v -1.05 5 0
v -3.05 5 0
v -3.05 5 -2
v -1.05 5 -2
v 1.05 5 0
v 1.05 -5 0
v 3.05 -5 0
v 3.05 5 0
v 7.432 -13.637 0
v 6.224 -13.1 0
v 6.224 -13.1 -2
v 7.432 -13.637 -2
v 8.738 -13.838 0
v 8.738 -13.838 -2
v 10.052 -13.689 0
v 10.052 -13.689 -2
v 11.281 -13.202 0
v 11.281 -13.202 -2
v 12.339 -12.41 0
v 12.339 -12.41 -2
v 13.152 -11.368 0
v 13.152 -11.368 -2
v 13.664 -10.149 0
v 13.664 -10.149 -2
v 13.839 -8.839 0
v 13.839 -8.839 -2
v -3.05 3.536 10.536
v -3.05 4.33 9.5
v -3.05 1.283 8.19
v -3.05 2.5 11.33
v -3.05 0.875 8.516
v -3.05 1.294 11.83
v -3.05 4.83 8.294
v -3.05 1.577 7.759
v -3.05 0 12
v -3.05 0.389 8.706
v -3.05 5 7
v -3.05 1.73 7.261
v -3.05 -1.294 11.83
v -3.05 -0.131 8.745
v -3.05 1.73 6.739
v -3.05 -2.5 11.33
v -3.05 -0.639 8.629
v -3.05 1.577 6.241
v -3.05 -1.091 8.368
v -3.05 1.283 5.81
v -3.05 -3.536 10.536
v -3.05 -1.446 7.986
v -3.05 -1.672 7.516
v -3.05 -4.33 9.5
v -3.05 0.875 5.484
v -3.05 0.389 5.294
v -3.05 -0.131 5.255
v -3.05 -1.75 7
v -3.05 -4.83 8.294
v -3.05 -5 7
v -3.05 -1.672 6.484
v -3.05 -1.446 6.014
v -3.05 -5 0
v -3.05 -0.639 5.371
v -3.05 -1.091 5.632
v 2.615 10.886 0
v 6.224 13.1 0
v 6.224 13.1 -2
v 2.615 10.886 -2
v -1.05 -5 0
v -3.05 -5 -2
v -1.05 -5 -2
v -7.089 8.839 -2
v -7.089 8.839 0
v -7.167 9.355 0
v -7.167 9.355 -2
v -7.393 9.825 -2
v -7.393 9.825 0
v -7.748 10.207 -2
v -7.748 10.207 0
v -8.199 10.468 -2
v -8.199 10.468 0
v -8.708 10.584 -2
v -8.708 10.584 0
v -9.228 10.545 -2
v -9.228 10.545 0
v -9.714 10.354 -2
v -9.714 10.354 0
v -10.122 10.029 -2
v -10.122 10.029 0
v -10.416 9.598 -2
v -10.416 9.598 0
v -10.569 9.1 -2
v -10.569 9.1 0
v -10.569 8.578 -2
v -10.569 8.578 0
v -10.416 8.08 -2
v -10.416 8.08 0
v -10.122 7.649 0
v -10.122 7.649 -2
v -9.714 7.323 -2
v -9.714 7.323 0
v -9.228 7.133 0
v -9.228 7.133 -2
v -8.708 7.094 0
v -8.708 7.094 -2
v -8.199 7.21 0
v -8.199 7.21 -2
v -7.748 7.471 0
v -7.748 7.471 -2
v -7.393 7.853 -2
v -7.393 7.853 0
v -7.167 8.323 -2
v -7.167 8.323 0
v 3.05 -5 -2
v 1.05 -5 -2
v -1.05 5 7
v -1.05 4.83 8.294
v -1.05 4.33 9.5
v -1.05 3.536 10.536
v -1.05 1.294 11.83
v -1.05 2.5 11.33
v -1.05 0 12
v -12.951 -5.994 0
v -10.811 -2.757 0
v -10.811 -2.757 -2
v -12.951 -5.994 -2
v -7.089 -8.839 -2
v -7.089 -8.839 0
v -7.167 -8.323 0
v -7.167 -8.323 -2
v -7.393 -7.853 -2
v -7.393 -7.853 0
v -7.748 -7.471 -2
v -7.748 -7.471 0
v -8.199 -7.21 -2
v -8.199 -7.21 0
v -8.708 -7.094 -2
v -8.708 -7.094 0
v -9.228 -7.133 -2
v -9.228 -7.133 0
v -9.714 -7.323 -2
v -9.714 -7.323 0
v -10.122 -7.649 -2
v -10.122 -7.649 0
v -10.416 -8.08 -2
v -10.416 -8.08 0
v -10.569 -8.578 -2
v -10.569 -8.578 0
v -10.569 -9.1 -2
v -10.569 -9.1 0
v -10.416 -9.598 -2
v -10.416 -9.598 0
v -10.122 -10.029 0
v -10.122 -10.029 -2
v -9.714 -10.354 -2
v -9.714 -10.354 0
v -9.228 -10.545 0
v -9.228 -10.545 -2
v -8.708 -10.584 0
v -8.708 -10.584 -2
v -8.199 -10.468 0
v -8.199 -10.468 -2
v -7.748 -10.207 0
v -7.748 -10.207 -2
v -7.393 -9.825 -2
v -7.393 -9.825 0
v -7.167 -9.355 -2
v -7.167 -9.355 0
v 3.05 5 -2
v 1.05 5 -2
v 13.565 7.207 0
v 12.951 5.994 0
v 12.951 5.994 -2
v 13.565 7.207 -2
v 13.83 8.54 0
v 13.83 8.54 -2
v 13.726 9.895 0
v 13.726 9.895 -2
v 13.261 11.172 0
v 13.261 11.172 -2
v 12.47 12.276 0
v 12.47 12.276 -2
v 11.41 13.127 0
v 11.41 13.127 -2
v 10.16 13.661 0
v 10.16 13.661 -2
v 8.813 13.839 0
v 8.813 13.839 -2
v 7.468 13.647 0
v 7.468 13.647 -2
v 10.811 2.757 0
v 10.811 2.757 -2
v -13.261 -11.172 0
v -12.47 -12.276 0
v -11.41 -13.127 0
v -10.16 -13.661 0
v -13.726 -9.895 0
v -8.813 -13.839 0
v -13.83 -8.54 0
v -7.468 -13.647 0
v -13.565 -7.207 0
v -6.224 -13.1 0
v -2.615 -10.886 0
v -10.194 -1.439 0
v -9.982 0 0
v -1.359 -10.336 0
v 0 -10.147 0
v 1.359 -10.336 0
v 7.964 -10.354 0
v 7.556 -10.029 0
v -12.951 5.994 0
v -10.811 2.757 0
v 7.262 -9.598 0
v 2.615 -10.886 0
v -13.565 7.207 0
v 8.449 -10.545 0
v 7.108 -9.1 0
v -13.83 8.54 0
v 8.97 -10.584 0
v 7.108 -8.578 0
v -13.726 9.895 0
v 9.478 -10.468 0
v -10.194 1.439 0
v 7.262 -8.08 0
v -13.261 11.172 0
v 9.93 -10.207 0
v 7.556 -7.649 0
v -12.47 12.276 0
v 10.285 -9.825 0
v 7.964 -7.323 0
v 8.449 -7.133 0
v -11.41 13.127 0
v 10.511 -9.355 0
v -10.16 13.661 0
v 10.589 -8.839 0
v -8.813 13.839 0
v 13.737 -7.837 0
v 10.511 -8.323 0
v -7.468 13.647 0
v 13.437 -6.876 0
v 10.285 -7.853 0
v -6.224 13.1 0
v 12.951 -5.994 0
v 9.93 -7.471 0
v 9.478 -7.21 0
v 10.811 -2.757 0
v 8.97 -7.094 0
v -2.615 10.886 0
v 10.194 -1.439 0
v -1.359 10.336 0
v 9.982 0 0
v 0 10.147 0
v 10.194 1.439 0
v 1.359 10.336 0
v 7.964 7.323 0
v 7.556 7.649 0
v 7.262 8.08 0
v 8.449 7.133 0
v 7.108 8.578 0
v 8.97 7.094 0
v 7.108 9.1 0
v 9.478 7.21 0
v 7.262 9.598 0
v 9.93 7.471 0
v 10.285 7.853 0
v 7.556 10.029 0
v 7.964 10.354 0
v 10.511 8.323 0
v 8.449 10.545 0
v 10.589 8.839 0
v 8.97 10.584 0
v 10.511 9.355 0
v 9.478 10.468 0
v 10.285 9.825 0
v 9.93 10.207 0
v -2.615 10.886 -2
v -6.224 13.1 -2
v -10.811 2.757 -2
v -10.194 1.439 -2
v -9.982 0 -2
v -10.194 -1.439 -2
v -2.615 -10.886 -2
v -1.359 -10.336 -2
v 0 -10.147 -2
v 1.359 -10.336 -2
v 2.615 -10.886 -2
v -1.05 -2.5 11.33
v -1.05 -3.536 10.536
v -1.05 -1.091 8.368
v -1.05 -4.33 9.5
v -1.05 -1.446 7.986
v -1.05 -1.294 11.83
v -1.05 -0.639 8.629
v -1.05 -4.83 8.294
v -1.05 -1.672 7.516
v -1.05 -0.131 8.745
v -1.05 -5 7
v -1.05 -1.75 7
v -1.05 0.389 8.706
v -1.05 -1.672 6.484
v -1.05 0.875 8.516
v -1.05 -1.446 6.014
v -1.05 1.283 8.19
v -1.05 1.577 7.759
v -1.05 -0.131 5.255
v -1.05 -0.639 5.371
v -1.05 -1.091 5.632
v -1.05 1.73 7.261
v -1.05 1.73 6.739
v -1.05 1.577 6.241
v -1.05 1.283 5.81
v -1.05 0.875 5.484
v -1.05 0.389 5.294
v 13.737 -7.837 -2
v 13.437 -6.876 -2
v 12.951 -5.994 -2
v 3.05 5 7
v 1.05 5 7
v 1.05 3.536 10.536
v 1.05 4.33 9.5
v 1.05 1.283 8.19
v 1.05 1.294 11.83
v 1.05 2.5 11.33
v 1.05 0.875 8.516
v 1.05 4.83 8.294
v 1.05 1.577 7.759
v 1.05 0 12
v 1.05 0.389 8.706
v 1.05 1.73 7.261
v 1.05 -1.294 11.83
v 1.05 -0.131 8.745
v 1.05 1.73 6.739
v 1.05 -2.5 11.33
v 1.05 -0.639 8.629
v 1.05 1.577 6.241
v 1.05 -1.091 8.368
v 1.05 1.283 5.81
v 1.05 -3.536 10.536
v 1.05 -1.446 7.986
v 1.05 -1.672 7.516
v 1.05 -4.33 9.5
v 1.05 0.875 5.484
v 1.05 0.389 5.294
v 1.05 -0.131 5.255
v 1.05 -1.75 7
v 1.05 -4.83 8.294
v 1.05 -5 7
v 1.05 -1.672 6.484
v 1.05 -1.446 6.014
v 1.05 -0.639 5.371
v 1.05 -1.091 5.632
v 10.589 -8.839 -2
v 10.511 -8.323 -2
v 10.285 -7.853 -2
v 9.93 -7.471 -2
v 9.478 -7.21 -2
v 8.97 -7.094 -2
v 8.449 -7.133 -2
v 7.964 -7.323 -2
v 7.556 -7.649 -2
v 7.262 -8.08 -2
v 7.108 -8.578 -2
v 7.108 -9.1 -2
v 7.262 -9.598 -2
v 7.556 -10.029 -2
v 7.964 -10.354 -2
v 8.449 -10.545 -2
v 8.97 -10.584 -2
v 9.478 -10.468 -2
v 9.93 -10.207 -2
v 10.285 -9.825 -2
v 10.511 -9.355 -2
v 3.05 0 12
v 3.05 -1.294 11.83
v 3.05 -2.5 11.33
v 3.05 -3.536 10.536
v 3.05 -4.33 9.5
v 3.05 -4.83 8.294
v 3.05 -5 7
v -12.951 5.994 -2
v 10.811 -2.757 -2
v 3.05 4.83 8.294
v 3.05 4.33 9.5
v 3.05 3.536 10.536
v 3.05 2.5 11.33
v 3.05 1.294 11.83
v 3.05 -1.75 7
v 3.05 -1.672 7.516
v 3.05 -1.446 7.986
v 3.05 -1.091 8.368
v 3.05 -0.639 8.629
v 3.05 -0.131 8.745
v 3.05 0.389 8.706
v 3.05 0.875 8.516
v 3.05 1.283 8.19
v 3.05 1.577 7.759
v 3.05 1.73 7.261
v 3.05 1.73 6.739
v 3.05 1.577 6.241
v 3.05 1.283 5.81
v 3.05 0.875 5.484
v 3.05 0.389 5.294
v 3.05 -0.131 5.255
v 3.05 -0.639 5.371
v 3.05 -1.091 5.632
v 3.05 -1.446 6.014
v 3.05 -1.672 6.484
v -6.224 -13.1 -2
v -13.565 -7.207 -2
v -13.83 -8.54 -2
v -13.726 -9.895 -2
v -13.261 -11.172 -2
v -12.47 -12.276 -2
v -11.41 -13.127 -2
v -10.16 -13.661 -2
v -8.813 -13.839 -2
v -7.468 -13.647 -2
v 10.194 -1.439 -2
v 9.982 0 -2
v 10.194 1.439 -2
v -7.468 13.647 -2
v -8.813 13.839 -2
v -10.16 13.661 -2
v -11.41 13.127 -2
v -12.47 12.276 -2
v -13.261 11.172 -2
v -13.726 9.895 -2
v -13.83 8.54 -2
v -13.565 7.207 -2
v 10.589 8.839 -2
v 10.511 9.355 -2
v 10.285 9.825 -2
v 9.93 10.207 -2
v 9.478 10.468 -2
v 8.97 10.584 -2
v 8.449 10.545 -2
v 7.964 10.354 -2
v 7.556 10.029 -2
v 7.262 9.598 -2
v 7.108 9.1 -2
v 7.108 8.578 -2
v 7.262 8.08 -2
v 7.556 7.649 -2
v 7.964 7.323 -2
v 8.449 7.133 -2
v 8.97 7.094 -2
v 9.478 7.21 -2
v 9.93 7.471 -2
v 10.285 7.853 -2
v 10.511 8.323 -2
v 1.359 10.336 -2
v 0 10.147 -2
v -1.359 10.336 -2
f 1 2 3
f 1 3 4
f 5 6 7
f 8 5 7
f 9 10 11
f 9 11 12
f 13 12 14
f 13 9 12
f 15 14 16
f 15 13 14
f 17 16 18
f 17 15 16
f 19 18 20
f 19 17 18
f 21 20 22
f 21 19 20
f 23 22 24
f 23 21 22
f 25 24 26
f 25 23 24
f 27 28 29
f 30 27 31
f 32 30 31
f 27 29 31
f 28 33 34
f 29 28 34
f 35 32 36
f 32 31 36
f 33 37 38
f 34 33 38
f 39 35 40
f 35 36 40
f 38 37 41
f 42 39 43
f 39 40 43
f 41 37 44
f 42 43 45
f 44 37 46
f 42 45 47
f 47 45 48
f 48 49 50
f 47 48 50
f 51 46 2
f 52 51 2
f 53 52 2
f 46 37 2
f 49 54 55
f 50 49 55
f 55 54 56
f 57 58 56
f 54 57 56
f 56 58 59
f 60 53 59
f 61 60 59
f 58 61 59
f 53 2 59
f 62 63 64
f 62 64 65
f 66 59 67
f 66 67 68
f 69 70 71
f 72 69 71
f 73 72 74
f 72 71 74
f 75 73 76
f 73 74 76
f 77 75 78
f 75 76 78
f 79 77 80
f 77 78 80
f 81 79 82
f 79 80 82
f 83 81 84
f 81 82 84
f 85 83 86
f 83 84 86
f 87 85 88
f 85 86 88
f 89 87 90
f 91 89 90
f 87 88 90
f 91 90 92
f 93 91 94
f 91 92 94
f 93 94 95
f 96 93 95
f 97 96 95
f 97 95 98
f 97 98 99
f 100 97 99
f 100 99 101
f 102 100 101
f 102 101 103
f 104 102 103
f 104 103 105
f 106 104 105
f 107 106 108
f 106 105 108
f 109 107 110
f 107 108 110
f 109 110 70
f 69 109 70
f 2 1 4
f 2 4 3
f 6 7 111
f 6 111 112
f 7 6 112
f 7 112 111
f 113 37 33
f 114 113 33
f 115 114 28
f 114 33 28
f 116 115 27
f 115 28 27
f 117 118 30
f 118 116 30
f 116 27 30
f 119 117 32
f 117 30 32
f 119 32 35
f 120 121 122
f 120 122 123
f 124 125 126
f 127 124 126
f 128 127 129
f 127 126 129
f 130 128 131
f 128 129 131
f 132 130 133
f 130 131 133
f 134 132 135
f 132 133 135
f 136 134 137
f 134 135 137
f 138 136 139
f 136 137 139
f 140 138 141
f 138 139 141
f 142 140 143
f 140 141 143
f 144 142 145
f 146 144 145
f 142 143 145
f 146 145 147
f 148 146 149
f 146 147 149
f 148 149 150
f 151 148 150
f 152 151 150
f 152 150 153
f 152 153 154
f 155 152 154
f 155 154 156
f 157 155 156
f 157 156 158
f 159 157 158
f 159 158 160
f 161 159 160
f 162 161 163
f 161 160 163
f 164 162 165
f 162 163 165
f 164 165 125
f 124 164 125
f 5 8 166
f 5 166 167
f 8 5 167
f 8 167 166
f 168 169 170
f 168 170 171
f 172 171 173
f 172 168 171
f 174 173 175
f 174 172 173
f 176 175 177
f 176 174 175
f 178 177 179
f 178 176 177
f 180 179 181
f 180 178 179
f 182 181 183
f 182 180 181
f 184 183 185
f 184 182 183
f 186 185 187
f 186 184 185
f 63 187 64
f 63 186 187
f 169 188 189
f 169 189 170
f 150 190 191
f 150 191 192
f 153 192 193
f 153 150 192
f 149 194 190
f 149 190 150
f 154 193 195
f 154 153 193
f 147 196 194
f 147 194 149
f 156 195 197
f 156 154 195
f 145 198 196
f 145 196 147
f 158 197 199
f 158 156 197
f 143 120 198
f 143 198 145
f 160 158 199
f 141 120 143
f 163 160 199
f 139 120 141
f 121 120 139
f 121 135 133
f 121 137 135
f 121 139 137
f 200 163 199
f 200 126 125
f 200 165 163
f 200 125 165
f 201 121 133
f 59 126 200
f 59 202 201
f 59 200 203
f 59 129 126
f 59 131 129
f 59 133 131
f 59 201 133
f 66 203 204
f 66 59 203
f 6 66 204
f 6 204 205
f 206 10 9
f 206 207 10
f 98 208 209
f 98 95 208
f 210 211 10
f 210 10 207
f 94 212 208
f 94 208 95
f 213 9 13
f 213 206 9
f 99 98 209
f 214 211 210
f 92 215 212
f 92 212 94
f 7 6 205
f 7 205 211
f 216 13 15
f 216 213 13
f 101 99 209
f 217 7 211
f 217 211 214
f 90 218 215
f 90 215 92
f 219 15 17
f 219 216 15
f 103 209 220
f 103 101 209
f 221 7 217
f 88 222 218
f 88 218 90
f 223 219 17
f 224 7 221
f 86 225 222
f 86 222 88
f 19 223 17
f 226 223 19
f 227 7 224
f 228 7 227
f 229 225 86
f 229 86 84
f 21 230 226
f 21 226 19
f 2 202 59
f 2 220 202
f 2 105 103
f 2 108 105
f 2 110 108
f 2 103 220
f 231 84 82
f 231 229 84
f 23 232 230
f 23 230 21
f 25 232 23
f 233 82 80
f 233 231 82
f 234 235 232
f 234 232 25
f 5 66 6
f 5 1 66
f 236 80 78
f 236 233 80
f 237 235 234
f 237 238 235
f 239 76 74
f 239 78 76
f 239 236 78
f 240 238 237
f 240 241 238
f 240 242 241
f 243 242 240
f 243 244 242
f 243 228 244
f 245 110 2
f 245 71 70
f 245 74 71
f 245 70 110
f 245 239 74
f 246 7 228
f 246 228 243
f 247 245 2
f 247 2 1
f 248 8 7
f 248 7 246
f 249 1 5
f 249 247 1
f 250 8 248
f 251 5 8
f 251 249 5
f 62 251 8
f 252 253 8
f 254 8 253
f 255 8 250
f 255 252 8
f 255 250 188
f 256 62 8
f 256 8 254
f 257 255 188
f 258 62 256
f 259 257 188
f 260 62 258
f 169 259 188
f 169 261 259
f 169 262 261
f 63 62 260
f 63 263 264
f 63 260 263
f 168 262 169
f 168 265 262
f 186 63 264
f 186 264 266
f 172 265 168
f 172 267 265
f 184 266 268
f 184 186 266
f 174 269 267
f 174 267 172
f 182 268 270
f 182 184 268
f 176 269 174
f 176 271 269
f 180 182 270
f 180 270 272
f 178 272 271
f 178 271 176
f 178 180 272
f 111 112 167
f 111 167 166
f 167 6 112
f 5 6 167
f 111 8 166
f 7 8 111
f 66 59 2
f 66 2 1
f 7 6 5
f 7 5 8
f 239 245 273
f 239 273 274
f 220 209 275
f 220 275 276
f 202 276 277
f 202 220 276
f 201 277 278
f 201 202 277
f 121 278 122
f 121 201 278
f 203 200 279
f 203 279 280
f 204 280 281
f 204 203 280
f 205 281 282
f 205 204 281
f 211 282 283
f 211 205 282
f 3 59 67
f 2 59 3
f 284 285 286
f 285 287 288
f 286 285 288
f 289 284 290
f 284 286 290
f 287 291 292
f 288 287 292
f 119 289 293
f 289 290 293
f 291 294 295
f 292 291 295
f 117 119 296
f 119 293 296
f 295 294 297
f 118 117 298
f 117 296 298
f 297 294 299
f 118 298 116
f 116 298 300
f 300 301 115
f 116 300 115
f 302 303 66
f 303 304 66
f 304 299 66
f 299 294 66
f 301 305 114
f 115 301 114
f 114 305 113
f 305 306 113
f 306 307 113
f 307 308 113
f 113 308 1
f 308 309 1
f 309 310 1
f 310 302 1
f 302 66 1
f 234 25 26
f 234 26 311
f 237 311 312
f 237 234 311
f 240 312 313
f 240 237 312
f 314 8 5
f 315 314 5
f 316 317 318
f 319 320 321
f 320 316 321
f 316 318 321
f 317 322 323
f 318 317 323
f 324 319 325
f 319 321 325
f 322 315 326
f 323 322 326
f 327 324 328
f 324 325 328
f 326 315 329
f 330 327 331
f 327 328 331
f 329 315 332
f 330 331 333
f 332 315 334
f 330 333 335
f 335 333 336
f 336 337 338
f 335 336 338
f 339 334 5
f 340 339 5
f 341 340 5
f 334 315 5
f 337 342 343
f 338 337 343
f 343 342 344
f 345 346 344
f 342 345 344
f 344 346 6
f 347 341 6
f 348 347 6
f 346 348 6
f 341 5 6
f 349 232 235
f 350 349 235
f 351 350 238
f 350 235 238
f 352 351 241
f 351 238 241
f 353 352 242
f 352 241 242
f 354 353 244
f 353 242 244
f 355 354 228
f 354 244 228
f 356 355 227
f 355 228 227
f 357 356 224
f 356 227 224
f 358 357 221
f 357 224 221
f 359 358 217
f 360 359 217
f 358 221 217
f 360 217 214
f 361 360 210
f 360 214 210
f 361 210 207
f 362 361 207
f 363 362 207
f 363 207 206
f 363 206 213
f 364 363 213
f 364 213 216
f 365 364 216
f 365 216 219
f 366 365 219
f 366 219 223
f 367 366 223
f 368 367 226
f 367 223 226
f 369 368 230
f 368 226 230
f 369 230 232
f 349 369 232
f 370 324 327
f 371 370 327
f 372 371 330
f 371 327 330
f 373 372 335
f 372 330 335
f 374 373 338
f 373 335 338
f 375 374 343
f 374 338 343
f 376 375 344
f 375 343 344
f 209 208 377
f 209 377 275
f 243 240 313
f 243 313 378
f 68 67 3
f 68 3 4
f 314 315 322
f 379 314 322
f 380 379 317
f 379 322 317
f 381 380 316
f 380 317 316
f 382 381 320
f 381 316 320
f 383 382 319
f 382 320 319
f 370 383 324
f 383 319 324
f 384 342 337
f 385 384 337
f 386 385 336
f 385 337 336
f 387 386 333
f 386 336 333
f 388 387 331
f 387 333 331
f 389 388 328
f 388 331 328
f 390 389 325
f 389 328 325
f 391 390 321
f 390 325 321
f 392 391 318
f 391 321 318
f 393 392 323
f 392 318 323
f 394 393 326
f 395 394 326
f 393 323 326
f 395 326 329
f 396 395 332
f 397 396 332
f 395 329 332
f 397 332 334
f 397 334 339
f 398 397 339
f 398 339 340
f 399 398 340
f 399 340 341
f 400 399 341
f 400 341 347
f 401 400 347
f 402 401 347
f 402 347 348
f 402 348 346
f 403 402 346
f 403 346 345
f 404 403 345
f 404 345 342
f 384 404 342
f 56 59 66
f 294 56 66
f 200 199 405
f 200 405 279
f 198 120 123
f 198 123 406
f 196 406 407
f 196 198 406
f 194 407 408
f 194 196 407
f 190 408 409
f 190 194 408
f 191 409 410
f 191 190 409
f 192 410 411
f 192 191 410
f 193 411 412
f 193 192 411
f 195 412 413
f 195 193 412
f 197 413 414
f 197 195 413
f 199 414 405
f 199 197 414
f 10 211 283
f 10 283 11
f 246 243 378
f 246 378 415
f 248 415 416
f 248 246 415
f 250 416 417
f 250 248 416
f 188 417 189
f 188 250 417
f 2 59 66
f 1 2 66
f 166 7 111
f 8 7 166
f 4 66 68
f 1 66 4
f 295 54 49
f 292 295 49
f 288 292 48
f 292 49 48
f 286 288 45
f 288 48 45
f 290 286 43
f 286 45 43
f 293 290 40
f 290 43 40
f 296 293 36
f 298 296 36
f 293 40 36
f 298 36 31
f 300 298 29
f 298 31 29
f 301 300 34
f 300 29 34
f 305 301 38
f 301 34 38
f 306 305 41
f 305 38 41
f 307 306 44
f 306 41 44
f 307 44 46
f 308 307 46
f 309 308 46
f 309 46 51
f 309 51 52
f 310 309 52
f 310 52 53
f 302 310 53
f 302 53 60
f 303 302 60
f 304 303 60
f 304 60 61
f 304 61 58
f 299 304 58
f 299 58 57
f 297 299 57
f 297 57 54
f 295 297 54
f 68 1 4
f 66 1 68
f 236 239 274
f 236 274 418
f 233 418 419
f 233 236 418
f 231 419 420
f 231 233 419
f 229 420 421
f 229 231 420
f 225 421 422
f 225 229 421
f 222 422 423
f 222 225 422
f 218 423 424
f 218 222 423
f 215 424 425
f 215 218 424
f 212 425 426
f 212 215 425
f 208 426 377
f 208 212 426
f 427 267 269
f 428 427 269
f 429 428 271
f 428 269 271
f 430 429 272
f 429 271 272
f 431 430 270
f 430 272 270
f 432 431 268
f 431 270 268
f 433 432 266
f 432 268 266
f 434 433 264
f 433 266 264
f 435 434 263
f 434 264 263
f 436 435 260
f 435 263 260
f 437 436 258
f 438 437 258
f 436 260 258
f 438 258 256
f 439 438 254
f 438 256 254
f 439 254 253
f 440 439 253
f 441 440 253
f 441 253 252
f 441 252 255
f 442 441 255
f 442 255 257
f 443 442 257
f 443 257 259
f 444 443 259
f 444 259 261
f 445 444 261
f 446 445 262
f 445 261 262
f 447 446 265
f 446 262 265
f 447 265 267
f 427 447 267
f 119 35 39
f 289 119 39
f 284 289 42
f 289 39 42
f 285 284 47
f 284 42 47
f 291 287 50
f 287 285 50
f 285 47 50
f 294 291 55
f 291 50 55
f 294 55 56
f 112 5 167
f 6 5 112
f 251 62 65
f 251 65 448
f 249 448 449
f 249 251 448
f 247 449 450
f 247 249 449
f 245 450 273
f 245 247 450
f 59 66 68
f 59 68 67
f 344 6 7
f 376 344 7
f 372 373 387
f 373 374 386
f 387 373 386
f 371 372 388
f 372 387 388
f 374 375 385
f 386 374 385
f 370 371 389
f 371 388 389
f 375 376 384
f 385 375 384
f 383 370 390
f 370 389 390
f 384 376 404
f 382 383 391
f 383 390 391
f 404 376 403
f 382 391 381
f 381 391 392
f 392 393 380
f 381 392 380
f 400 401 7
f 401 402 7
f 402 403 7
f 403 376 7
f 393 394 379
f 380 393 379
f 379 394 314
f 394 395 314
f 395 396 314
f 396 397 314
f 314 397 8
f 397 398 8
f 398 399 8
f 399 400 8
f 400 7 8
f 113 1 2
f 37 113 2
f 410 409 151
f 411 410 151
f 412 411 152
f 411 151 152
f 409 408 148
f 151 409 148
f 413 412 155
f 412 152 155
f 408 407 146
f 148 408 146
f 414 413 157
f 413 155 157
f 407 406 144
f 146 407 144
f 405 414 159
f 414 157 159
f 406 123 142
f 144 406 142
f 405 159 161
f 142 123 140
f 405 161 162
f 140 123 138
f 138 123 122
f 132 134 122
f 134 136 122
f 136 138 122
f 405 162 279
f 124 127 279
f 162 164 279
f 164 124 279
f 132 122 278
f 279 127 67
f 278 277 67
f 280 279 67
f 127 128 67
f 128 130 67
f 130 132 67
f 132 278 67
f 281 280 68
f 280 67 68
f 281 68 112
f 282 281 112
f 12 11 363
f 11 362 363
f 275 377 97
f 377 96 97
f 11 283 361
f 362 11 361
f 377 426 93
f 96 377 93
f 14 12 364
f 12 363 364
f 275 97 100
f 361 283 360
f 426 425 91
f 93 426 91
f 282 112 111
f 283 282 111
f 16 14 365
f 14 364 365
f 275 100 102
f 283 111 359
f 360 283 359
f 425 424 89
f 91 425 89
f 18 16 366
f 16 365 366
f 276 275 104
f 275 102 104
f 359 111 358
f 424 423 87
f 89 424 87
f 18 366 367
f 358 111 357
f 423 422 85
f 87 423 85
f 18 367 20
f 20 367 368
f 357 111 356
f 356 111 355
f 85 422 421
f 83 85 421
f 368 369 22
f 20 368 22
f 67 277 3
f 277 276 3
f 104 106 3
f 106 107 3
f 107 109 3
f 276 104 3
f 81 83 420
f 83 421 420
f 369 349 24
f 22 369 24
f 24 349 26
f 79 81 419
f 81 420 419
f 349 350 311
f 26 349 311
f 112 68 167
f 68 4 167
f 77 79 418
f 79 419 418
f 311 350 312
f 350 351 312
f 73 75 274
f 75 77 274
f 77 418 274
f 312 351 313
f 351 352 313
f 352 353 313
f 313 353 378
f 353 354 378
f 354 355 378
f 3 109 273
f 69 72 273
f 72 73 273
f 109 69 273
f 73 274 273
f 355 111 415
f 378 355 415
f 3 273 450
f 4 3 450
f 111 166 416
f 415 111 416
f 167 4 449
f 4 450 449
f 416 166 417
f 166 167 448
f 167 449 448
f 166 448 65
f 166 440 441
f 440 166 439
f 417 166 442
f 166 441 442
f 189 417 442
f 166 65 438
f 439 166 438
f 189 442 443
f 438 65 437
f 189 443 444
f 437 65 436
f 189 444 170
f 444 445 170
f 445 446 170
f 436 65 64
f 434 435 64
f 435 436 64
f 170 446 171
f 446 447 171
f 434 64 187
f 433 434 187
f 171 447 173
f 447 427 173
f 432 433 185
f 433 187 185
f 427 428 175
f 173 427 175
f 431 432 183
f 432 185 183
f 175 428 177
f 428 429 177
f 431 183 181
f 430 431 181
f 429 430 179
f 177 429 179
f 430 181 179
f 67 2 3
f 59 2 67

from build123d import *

# Parameters (mm, degrees)
F1_DEPTH = 12
F2_DEPTH = 2
F3_R     = 1.75
F4_DEPTH = 25
F0_R     = 1.75
F5_DEPTH = 2


# Not quite as in the source:
# - a feature names something its author has since deleted; it is built from what else it names


with BuildPart() as f1:
    # F0 (on Top) → F1 (new body)
    with BuildSketch(Plane.XY):
        Polygon((-3.05, 5), (-3.05, 0), (-3.05, -5), (-1.05, -5), (-1.05, 0), (-1.05, 5), align=None)
    extrude(amount=F1_DEPTH)


with BuildPart() as f1b:
    # F0 (on Top) → F1, piece 2 (new body)
    with BuildSketch(Plane.XY):
        Polygon((3.05, 0), (3.05, 5), (1.05, 5), (1.05, 0), (1.05, -5), (3.05, -5), align=None)
    extrude(amount=F1_DEPTH)


with BuildPart() as f2:
    # F0 (on Top) → F2 (new body)
    with BuildSketch(Plane.XY):
        Polygon((-3.05, 5), (-3.05, 0), (-3.05, -5), (-1.05, -5), (-1.05, 0), (-1.05, 5), align=None)
    extrude(amount=-F2_DEPTH)


with BuildPart() as f2b:
    # F0 (on Top) → F2, piece 2 (new body)
    with BuildSketch(Plane.XY):
        Polygon((3.05, 0), (3.05, 5), (1.05, 5), (1.05, 0), (1.05, -5), (3.05, -5), align=None)
    extrude(amount=-F2_DEPTH)


with BuildPart() as f4_tool:
    # F3 (on face) → F4 (new body)
    with BuildSketch(Plane(origin=(-3.05, 0, 0), x_dir=(0, -1, 0), z_dir=(-1, 0, 0))):
        with BuildLine():
            ThreePointArc((-5, 7), (-3.5355339059, 10.5355339059), (0, 12))
            Line((0, 12), (-5, 12))
            Line((-5, 12), (-5, 7))
        make_face()
        with Locations((0, 7)):
            Circle(F3_R)
        with BuildLine():
            ThreePointArc((0, 12), (3.5355339059, 10.5355339059), (5, 7))
            Line((5, 7), (5, 12))
            Line((5, 12), (0, 12))
        make_face()
    extrude(amount=-F4_DEPTH)


with BuildPart() as f1_1:
    add(f1.part)

    # F4: cut by f4_tool
    add(f4_tool.part, mode=Mode.SUBTRACT)


with BuildPart() as f1b_1:
    add(f1b.part)

    # F4: cut by f4_tool
    add(f4_tool.part, mode=Mode.SUBTRACT)


with BuildPart() as f5:
    # F0 (on Top) → F5 (new body)
    with BuildSketch(Plane.XY):
        with BuildLine():
            Line((10.8111245395, 2.756994834), (12.9509348337, 5.9944309568))
            ThreePointArc((12.9509348337, 5.9944309568), (12.4697533606, 12.2763382413), (6.2235598652, 13.1003294791))
            Line((6.2235598652, 13.1003294791), (2.6152748996, 10.8859287267))
            ThreePointArc((2.6152748996, 10.8859287267), (0, 10.147423441), (-2.6152748996, 10.8859287267))
            Line((-2.6152748996, 10.8859287267), (-6.2235598652, 13.1003294791))
            ThreePointArc((-6.2235598652, 13.1003294791), (-4.4755576422, 11.2805171256), (-3.8388347648, 8.8388347648))
            ThreePointArc((-3.8388347648, 8.8388347648), (-7.3489522769, 4.0659687315), (-12.9509348337, 5.9944309568))
            Line((-12.9509348337, 5.9944309568), (-10.8111245395, 2.756994834))
            ThreePointArc((-10.8111245395, 2.756994834), (-9.9823329358, 0), (-10.8111245395, -2.756994834))
            Line((-10.8111245395, -2.756994834), (-12.9509348337, -5.9944309568))
            ThreePointArc((-12.9509348337, -5.9944309568), (-7.3489522769, -4.0659687315), (-3.8388347648, -8.8388347648))
            ThreePointArc((-3.8388347648, -8.8388347648), (-4.4755576422, -11.2805171256), (-6.2235598652, -13.1003294791))
            Line((-6.2235598652, -13.1003294791), (-2.6152748996, -10.8859287267))
            ThreePointArc((-2.6152748996, -10.8859287267), (0, -10.147423441), (2.6152748996, -10.8859287267))
            Line((2.6152748996, -10.8859287267), (6.2235598652, -13.1003294791))
            ThreePointArc((6.2235598652, -13.1003294791), (5.2079161691, -5.4013312883), (12.9509348337, -5.9944309568))
            Line((12.9509348337, -5.9944309568), (10.8111245395, -2.756994834))
            ThreePointArc((10.8111245395, -2.756994834), (9.9823329358, 0), (10.8111245395, 2.756994834))
        make_face()
        Polygon((-3.05, -5), (-3.05, 0), (-3.05, 5), (-1.05, 5), (-1.05, 0), (-1.05, -5), align=None, mode=Mode.SUBTRACT)
        Polygon((1.05, 5), (3.05, 5), (3.05, 0), (3.05, -5), (1.05, -5), (1.05, 0), align=None, mode=Mode.SUBTRACT)
        with Locations((8.8388347648, 8.8388347648)):
            Circle(F0_R, mode=Mode.SUBTRACT)
        with BuildLine():
            ThreePointArc((13.8388347648, -8.8388347648), (13.6117007982, -7.3489522769), (12.9509348337, -5.9944309568))
            ThreePointArc((12.9509348337, -5.9944309568), (5.2079161691, -5.4013312883), (6.2235598652, -13.1003294791))
            ThreePointArc((6.2235598652, -13.1003294791), (11.2805171256, -13.2021118875), (13.8388347648, -8.8388347648))
        make_face()
        with Locations((8.8388347648, -8.8388347648)):
            Circle(F0_R, mode=Mode.SUBTRACT)
        with BuildLine():
            ThreePointArc((-3.8388347648, 8.8388347648), (-4.4755576422, 11.2805171256), (-6.2235598652, 13.1003294791))
            ThreePointArc((-6.2235598652, 13.1003294791), (-12.4697533606, 12.2763382413), (-12.9509348337, 5.9944309568))
            ThreePointArc((-12.9509348337, 5.9944309568), (-7.3489522769, 4.0659687315), (-3.8388347648, 8.8388347648))
        make_face()
        with Locations((-8.8388347648, 8.8388347648)):
            Circle(F0_R, mode=Mode.SUBTRACT)
        with BuildLine():
            ThreePointArc((-12.9509348337, -5.9944309568), (-12.4697533606, -12.2763382413), (-6.2235598652, -13.1003294791))
            ThreePointArc((-6.2235598652, -13.1003294791), (-4.4755576422, -11.2805171256), (-3.8388347648, -8.8388347648))
            ThreePointArc((-3.8388347648, -8.8388347648), (-7.3489522769, -4.0659687315), (-12.9509348337, -5.9944309568))
        make_face()
        with Locations((-8.8388347648, -8.8388347648)):
            Circle(F0_R, mode=Mode.SUBTRACT)
    extrude(amount=-F5_DEPTH)


solid = Compound([f2.part, f2b.part, f1_1.part, f1b_1.part, f5.part])
